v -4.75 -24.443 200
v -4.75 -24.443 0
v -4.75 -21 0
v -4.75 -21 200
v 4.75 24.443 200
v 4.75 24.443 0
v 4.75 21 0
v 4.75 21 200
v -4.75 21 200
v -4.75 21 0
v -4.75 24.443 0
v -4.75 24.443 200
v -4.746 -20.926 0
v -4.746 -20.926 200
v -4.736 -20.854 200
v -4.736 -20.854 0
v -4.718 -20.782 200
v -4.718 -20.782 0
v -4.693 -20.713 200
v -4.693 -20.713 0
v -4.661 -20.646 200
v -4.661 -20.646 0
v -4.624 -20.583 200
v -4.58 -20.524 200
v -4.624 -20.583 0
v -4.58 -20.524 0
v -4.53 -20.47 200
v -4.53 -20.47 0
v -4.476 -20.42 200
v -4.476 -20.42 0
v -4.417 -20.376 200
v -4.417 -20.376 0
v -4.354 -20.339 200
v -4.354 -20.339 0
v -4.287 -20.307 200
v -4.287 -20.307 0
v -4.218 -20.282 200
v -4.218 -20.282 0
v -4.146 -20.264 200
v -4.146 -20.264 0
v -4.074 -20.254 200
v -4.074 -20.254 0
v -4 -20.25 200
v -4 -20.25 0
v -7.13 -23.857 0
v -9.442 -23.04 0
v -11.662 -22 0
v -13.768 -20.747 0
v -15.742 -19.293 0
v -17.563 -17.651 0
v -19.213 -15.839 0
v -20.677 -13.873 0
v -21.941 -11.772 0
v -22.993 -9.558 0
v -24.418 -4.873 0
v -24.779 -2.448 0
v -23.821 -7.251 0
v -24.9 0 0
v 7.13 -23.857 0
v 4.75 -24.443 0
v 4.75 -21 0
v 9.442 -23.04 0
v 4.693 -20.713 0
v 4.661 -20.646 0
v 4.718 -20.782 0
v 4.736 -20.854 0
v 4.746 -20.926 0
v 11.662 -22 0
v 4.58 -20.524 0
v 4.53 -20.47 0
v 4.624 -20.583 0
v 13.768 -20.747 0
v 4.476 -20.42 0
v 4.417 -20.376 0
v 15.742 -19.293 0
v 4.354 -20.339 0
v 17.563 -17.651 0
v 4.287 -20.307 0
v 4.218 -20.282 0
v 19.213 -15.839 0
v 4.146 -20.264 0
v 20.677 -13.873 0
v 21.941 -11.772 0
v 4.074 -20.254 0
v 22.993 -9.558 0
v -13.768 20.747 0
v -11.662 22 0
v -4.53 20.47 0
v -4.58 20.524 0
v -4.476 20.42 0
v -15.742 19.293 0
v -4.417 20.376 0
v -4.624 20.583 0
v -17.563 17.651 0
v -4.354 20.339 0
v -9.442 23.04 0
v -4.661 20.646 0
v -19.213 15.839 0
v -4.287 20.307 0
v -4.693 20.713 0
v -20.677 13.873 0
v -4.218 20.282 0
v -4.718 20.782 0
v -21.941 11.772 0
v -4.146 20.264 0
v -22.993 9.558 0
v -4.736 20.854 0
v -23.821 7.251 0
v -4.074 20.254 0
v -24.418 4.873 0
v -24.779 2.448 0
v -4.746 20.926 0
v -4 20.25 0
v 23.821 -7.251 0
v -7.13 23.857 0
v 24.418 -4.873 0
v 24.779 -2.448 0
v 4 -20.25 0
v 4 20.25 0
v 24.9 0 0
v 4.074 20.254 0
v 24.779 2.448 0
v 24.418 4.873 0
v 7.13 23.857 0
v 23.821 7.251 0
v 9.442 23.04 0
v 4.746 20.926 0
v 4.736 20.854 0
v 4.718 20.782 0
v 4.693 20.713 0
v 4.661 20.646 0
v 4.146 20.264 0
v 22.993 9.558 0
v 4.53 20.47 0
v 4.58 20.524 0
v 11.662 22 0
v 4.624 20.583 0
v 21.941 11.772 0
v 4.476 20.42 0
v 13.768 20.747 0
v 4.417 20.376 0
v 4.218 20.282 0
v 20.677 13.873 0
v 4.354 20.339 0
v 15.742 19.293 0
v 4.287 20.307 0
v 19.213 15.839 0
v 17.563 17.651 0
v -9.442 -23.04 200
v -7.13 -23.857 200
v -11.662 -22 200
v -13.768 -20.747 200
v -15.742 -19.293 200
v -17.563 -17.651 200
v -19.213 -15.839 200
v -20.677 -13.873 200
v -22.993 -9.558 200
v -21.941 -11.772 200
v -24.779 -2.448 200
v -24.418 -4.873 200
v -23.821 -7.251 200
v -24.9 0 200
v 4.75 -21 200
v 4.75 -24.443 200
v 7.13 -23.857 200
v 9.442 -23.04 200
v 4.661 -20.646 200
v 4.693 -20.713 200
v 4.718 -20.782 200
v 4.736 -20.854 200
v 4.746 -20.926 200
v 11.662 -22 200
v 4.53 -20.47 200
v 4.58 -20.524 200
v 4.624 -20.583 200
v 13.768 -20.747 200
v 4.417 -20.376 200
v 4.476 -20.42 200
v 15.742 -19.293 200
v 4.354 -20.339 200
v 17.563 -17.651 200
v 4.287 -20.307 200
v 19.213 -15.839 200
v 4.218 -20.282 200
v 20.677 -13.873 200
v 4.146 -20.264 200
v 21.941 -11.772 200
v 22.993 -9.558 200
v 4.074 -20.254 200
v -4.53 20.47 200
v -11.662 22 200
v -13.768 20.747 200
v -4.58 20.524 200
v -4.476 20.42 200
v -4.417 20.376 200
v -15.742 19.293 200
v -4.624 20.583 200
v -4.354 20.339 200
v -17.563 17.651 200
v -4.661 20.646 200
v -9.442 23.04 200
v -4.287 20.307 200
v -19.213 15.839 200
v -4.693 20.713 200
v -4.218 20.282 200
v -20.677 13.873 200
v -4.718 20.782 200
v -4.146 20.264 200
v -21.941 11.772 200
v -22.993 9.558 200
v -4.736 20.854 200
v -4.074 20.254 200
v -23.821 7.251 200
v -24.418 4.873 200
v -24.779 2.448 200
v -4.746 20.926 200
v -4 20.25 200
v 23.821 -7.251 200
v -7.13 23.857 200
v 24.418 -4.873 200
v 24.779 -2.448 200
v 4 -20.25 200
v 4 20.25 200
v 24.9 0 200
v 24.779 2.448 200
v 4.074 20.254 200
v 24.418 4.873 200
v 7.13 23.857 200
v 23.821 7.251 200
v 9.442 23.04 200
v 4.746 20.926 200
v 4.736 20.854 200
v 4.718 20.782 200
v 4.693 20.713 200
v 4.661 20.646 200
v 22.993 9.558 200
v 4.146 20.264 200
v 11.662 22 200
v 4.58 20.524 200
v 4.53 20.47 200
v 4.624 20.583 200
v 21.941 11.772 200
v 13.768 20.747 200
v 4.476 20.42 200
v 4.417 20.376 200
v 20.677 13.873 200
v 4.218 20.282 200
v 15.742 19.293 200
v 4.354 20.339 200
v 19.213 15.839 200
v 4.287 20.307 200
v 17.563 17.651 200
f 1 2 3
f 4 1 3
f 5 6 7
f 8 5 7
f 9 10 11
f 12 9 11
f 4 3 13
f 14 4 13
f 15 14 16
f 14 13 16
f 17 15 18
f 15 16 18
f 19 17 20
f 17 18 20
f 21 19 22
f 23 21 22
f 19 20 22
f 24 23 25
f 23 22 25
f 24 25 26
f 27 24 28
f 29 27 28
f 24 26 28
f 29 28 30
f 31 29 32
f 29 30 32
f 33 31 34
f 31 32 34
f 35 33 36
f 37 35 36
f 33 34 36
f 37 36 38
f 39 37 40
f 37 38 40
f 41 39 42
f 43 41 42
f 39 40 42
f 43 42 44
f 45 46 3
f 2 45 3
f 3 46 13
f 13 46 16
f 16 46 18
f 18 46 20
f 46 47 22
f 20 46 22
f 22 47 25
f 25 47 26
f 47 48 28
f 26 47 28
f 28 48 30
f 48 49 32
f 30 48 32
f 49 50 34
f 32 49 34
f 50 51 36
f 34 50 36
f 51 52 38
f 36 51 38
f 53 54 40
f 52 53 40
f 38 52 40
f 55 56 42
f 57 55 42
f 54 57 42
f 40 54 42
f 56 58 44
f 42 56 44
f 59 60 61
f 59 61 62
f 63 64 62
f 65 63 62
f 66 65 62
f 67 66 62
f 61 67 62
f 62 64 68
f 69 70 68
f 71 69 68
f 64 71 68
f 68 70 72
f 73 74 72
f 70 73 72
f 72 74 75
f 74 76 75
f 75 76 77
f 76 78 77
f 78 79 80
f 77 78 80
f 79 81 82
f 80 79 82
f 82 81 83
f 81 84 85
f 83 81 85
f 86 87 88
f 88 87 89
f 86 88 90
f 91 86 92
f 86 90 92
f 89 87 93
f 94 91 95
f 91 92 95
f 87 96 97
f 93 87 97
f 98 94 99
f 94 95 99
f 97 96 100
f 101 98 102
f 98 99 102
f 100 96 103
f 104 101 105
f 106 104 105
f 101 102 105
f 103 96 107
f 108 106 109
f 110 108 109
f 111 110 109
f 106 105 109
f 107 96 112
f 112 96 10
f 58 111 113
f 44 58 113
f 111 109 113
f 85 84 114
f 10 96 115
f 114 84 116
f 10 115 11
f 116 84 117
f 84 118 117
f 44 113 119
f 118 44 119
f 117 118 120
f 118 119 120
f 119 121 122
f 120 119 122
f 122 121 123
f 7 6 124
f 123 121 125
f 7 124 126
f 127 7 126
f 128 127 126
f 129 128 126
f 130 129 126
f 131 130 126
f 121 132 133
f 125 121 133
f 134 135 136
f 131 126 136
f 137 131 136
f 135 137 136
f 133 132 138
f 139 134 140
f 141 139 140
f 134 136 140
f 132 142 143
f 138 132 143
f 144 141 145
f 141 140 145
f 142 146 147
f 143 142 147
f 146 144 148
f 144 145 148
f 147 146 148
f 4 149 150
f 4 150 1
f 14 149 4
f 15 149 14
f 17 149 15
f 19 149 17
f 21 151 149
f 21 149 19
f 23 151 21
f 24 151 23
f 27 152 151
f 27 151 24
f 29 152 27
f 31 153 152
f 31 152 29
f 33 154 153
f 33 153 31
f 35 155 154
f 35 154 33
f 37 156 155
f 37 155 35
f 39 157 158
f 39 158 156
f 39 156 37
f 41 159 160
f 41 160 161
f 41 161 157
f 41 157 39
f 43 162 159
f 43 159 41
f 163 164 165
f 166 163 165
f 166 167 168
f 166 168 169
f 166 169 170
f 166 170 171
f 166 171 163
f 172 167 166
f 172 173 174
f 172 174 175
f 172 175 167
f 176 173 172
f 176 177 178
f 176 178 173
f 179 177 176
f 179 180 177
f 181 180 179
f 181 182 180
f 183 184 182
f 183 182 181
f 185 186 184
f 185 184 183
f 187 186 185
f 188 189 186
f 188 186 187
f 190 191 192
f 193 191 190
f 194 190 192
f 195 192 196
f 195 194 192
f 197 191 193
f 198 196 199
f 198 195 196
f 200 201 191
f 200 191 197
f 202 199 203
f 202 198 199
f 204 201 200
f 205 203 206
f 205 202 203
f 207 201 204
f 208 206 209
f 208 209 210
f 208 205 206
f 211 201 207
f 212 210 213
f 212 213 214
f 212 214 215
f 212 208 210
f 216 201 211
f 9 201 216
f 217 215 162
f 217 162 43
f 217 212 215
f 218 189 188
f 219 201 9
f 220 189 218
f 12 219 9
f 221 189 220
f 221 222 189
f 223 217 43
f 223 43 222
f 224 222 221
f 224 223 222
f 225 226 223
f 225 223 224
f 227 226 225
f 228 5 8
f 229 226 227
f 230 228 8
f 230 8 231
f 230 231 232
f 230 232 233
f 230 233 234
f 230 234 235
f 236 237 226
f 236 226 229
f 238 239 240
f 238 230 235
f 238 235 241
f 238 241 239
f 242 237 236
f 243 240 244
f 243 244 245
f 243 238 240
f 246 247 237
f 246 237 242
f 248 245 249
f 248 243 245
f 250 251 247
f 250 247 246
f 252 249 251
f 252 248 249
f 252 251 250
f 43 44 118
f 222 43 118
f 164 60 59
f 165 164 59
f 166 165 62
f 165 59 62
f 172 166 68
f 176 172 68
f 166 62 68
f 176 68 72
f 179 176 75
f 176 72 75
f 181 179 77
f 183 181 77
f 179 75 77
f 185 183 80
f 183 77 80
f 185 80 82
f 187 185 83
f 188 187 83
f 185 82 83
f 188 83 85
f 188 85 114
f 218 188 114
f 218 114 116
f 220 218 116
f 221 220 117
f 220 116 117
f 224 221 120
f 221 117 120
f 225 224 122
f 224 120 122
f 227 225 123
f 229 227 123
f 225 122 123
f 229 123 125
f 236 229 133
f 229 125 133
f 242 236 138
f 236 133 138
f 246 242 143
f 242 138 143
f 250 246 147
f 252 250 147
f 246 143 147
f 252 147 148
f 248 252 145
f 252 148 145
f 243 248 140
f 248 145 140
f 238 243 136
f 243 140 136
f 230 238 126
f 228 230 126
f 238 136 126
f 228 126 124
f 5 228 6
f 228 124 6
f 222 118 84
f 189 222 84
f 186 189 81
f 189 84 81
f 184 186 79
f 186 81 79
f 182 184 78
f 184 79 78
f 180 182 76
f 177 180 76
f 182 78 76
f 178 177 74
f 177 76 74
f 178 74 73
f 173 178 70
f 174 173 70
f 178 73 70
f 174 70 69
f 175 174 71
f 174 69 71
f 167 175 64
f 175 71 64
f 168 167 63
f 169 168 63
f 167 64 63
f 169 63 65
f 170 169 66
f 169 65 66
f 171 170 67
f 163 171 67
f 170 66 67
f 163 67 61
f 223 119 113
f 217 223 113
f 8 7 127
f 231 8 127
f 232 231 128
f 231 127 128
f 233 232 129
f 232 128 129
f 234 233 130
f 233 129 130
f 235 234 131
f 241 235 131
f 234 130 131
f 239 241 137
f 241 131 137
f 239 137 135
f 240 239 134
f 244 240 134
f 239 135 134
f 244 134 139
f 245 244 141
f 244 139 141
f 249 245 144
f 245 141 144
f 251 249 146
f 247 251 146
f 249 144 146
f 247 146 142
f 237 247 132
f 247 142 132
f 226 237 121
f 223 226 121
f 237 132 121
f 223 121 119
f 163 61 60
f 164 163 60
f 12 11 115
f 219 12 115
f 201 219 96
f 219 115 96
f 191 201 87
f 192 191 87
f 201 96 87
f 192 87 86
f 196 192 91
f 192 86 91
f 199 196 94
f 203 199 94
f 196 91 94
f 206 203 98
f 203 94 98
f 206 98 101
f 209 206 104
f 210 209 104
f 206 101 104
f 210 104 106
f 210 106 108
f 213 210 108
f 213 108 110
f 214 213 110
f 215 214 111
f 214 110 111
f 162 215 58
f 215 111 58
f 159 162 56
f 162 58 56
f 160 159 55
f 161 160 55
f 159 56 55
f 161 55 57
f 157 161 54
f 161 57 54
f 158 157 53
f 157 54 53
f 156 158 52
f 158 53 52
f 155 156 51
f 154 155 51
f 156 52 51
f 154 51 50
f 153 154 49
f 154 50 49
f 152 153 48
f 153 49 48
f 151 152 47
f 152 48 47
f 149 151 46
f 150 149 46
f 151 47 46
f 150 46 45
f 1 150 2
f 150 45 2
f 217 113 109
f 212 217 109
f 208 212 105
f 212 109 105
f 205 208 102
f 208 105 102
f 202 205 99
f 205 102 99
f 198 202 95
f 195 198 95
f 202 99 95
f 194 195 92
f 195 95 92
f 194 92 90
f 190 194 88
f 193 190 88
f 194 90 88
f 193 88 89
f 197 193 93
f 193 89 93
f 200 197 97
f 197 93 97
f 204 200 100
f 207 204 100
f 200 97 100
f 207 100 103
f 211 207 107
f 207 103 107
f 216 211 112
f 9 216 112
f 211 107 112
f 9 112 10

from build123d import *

# Parameters (mm, degrees)
Y_KSEKLIK_EKSTR_ZYON3_DEPTH = 200


with BuildPart() as part:
    # Model → Yükseklik-Ekstrüzyon3 (new body)
    with BuildSketch(Plane.XY):
        with BuildLine():
            Line((-4.75, 21), (-4.75, 24.442739208))
            ThreePointArc((-4.75, 24.442739208), (-24.9, 0), (-4.75, -24.442739208))
            Line((-4.75, -24.442739208), (-4.75, -21))
            ThreePointArc((-4.75, -21), (-4.530330086, -20.469669914), (-4, -20.25))
            Line((-4, -20.25), (0, -20.25))
            Line((0, -20.25), (4, -20.25))
            ThreePointArc((4, -20.25), (4.530330086, -20.469669914), (4.75, -21))
            Line((4.75, -21), (4.75, -24.442739208))
            ThreePointArc((4.75, -24.442739208), (24.9, 0), (4.75, 24.442739208))
            Line((4.75, 24.442739208), (4.75, 21))
            ThreePointArc((4.75, 21), (4.530330086, 20.469669914), (4, 20.25))
            Line((4, 20.25), (0, 20.25))
            Line((0, 20.25), (-4, 20.25))
            ThreePointArc((-4, 20.25), (-4.530330086, 20.469669914), (-4.75, 21))
        make_face()
    extrude(amount=Y_KSEKLIK_EKSTR_ZYON3_DEPTH)


solid = part.part
